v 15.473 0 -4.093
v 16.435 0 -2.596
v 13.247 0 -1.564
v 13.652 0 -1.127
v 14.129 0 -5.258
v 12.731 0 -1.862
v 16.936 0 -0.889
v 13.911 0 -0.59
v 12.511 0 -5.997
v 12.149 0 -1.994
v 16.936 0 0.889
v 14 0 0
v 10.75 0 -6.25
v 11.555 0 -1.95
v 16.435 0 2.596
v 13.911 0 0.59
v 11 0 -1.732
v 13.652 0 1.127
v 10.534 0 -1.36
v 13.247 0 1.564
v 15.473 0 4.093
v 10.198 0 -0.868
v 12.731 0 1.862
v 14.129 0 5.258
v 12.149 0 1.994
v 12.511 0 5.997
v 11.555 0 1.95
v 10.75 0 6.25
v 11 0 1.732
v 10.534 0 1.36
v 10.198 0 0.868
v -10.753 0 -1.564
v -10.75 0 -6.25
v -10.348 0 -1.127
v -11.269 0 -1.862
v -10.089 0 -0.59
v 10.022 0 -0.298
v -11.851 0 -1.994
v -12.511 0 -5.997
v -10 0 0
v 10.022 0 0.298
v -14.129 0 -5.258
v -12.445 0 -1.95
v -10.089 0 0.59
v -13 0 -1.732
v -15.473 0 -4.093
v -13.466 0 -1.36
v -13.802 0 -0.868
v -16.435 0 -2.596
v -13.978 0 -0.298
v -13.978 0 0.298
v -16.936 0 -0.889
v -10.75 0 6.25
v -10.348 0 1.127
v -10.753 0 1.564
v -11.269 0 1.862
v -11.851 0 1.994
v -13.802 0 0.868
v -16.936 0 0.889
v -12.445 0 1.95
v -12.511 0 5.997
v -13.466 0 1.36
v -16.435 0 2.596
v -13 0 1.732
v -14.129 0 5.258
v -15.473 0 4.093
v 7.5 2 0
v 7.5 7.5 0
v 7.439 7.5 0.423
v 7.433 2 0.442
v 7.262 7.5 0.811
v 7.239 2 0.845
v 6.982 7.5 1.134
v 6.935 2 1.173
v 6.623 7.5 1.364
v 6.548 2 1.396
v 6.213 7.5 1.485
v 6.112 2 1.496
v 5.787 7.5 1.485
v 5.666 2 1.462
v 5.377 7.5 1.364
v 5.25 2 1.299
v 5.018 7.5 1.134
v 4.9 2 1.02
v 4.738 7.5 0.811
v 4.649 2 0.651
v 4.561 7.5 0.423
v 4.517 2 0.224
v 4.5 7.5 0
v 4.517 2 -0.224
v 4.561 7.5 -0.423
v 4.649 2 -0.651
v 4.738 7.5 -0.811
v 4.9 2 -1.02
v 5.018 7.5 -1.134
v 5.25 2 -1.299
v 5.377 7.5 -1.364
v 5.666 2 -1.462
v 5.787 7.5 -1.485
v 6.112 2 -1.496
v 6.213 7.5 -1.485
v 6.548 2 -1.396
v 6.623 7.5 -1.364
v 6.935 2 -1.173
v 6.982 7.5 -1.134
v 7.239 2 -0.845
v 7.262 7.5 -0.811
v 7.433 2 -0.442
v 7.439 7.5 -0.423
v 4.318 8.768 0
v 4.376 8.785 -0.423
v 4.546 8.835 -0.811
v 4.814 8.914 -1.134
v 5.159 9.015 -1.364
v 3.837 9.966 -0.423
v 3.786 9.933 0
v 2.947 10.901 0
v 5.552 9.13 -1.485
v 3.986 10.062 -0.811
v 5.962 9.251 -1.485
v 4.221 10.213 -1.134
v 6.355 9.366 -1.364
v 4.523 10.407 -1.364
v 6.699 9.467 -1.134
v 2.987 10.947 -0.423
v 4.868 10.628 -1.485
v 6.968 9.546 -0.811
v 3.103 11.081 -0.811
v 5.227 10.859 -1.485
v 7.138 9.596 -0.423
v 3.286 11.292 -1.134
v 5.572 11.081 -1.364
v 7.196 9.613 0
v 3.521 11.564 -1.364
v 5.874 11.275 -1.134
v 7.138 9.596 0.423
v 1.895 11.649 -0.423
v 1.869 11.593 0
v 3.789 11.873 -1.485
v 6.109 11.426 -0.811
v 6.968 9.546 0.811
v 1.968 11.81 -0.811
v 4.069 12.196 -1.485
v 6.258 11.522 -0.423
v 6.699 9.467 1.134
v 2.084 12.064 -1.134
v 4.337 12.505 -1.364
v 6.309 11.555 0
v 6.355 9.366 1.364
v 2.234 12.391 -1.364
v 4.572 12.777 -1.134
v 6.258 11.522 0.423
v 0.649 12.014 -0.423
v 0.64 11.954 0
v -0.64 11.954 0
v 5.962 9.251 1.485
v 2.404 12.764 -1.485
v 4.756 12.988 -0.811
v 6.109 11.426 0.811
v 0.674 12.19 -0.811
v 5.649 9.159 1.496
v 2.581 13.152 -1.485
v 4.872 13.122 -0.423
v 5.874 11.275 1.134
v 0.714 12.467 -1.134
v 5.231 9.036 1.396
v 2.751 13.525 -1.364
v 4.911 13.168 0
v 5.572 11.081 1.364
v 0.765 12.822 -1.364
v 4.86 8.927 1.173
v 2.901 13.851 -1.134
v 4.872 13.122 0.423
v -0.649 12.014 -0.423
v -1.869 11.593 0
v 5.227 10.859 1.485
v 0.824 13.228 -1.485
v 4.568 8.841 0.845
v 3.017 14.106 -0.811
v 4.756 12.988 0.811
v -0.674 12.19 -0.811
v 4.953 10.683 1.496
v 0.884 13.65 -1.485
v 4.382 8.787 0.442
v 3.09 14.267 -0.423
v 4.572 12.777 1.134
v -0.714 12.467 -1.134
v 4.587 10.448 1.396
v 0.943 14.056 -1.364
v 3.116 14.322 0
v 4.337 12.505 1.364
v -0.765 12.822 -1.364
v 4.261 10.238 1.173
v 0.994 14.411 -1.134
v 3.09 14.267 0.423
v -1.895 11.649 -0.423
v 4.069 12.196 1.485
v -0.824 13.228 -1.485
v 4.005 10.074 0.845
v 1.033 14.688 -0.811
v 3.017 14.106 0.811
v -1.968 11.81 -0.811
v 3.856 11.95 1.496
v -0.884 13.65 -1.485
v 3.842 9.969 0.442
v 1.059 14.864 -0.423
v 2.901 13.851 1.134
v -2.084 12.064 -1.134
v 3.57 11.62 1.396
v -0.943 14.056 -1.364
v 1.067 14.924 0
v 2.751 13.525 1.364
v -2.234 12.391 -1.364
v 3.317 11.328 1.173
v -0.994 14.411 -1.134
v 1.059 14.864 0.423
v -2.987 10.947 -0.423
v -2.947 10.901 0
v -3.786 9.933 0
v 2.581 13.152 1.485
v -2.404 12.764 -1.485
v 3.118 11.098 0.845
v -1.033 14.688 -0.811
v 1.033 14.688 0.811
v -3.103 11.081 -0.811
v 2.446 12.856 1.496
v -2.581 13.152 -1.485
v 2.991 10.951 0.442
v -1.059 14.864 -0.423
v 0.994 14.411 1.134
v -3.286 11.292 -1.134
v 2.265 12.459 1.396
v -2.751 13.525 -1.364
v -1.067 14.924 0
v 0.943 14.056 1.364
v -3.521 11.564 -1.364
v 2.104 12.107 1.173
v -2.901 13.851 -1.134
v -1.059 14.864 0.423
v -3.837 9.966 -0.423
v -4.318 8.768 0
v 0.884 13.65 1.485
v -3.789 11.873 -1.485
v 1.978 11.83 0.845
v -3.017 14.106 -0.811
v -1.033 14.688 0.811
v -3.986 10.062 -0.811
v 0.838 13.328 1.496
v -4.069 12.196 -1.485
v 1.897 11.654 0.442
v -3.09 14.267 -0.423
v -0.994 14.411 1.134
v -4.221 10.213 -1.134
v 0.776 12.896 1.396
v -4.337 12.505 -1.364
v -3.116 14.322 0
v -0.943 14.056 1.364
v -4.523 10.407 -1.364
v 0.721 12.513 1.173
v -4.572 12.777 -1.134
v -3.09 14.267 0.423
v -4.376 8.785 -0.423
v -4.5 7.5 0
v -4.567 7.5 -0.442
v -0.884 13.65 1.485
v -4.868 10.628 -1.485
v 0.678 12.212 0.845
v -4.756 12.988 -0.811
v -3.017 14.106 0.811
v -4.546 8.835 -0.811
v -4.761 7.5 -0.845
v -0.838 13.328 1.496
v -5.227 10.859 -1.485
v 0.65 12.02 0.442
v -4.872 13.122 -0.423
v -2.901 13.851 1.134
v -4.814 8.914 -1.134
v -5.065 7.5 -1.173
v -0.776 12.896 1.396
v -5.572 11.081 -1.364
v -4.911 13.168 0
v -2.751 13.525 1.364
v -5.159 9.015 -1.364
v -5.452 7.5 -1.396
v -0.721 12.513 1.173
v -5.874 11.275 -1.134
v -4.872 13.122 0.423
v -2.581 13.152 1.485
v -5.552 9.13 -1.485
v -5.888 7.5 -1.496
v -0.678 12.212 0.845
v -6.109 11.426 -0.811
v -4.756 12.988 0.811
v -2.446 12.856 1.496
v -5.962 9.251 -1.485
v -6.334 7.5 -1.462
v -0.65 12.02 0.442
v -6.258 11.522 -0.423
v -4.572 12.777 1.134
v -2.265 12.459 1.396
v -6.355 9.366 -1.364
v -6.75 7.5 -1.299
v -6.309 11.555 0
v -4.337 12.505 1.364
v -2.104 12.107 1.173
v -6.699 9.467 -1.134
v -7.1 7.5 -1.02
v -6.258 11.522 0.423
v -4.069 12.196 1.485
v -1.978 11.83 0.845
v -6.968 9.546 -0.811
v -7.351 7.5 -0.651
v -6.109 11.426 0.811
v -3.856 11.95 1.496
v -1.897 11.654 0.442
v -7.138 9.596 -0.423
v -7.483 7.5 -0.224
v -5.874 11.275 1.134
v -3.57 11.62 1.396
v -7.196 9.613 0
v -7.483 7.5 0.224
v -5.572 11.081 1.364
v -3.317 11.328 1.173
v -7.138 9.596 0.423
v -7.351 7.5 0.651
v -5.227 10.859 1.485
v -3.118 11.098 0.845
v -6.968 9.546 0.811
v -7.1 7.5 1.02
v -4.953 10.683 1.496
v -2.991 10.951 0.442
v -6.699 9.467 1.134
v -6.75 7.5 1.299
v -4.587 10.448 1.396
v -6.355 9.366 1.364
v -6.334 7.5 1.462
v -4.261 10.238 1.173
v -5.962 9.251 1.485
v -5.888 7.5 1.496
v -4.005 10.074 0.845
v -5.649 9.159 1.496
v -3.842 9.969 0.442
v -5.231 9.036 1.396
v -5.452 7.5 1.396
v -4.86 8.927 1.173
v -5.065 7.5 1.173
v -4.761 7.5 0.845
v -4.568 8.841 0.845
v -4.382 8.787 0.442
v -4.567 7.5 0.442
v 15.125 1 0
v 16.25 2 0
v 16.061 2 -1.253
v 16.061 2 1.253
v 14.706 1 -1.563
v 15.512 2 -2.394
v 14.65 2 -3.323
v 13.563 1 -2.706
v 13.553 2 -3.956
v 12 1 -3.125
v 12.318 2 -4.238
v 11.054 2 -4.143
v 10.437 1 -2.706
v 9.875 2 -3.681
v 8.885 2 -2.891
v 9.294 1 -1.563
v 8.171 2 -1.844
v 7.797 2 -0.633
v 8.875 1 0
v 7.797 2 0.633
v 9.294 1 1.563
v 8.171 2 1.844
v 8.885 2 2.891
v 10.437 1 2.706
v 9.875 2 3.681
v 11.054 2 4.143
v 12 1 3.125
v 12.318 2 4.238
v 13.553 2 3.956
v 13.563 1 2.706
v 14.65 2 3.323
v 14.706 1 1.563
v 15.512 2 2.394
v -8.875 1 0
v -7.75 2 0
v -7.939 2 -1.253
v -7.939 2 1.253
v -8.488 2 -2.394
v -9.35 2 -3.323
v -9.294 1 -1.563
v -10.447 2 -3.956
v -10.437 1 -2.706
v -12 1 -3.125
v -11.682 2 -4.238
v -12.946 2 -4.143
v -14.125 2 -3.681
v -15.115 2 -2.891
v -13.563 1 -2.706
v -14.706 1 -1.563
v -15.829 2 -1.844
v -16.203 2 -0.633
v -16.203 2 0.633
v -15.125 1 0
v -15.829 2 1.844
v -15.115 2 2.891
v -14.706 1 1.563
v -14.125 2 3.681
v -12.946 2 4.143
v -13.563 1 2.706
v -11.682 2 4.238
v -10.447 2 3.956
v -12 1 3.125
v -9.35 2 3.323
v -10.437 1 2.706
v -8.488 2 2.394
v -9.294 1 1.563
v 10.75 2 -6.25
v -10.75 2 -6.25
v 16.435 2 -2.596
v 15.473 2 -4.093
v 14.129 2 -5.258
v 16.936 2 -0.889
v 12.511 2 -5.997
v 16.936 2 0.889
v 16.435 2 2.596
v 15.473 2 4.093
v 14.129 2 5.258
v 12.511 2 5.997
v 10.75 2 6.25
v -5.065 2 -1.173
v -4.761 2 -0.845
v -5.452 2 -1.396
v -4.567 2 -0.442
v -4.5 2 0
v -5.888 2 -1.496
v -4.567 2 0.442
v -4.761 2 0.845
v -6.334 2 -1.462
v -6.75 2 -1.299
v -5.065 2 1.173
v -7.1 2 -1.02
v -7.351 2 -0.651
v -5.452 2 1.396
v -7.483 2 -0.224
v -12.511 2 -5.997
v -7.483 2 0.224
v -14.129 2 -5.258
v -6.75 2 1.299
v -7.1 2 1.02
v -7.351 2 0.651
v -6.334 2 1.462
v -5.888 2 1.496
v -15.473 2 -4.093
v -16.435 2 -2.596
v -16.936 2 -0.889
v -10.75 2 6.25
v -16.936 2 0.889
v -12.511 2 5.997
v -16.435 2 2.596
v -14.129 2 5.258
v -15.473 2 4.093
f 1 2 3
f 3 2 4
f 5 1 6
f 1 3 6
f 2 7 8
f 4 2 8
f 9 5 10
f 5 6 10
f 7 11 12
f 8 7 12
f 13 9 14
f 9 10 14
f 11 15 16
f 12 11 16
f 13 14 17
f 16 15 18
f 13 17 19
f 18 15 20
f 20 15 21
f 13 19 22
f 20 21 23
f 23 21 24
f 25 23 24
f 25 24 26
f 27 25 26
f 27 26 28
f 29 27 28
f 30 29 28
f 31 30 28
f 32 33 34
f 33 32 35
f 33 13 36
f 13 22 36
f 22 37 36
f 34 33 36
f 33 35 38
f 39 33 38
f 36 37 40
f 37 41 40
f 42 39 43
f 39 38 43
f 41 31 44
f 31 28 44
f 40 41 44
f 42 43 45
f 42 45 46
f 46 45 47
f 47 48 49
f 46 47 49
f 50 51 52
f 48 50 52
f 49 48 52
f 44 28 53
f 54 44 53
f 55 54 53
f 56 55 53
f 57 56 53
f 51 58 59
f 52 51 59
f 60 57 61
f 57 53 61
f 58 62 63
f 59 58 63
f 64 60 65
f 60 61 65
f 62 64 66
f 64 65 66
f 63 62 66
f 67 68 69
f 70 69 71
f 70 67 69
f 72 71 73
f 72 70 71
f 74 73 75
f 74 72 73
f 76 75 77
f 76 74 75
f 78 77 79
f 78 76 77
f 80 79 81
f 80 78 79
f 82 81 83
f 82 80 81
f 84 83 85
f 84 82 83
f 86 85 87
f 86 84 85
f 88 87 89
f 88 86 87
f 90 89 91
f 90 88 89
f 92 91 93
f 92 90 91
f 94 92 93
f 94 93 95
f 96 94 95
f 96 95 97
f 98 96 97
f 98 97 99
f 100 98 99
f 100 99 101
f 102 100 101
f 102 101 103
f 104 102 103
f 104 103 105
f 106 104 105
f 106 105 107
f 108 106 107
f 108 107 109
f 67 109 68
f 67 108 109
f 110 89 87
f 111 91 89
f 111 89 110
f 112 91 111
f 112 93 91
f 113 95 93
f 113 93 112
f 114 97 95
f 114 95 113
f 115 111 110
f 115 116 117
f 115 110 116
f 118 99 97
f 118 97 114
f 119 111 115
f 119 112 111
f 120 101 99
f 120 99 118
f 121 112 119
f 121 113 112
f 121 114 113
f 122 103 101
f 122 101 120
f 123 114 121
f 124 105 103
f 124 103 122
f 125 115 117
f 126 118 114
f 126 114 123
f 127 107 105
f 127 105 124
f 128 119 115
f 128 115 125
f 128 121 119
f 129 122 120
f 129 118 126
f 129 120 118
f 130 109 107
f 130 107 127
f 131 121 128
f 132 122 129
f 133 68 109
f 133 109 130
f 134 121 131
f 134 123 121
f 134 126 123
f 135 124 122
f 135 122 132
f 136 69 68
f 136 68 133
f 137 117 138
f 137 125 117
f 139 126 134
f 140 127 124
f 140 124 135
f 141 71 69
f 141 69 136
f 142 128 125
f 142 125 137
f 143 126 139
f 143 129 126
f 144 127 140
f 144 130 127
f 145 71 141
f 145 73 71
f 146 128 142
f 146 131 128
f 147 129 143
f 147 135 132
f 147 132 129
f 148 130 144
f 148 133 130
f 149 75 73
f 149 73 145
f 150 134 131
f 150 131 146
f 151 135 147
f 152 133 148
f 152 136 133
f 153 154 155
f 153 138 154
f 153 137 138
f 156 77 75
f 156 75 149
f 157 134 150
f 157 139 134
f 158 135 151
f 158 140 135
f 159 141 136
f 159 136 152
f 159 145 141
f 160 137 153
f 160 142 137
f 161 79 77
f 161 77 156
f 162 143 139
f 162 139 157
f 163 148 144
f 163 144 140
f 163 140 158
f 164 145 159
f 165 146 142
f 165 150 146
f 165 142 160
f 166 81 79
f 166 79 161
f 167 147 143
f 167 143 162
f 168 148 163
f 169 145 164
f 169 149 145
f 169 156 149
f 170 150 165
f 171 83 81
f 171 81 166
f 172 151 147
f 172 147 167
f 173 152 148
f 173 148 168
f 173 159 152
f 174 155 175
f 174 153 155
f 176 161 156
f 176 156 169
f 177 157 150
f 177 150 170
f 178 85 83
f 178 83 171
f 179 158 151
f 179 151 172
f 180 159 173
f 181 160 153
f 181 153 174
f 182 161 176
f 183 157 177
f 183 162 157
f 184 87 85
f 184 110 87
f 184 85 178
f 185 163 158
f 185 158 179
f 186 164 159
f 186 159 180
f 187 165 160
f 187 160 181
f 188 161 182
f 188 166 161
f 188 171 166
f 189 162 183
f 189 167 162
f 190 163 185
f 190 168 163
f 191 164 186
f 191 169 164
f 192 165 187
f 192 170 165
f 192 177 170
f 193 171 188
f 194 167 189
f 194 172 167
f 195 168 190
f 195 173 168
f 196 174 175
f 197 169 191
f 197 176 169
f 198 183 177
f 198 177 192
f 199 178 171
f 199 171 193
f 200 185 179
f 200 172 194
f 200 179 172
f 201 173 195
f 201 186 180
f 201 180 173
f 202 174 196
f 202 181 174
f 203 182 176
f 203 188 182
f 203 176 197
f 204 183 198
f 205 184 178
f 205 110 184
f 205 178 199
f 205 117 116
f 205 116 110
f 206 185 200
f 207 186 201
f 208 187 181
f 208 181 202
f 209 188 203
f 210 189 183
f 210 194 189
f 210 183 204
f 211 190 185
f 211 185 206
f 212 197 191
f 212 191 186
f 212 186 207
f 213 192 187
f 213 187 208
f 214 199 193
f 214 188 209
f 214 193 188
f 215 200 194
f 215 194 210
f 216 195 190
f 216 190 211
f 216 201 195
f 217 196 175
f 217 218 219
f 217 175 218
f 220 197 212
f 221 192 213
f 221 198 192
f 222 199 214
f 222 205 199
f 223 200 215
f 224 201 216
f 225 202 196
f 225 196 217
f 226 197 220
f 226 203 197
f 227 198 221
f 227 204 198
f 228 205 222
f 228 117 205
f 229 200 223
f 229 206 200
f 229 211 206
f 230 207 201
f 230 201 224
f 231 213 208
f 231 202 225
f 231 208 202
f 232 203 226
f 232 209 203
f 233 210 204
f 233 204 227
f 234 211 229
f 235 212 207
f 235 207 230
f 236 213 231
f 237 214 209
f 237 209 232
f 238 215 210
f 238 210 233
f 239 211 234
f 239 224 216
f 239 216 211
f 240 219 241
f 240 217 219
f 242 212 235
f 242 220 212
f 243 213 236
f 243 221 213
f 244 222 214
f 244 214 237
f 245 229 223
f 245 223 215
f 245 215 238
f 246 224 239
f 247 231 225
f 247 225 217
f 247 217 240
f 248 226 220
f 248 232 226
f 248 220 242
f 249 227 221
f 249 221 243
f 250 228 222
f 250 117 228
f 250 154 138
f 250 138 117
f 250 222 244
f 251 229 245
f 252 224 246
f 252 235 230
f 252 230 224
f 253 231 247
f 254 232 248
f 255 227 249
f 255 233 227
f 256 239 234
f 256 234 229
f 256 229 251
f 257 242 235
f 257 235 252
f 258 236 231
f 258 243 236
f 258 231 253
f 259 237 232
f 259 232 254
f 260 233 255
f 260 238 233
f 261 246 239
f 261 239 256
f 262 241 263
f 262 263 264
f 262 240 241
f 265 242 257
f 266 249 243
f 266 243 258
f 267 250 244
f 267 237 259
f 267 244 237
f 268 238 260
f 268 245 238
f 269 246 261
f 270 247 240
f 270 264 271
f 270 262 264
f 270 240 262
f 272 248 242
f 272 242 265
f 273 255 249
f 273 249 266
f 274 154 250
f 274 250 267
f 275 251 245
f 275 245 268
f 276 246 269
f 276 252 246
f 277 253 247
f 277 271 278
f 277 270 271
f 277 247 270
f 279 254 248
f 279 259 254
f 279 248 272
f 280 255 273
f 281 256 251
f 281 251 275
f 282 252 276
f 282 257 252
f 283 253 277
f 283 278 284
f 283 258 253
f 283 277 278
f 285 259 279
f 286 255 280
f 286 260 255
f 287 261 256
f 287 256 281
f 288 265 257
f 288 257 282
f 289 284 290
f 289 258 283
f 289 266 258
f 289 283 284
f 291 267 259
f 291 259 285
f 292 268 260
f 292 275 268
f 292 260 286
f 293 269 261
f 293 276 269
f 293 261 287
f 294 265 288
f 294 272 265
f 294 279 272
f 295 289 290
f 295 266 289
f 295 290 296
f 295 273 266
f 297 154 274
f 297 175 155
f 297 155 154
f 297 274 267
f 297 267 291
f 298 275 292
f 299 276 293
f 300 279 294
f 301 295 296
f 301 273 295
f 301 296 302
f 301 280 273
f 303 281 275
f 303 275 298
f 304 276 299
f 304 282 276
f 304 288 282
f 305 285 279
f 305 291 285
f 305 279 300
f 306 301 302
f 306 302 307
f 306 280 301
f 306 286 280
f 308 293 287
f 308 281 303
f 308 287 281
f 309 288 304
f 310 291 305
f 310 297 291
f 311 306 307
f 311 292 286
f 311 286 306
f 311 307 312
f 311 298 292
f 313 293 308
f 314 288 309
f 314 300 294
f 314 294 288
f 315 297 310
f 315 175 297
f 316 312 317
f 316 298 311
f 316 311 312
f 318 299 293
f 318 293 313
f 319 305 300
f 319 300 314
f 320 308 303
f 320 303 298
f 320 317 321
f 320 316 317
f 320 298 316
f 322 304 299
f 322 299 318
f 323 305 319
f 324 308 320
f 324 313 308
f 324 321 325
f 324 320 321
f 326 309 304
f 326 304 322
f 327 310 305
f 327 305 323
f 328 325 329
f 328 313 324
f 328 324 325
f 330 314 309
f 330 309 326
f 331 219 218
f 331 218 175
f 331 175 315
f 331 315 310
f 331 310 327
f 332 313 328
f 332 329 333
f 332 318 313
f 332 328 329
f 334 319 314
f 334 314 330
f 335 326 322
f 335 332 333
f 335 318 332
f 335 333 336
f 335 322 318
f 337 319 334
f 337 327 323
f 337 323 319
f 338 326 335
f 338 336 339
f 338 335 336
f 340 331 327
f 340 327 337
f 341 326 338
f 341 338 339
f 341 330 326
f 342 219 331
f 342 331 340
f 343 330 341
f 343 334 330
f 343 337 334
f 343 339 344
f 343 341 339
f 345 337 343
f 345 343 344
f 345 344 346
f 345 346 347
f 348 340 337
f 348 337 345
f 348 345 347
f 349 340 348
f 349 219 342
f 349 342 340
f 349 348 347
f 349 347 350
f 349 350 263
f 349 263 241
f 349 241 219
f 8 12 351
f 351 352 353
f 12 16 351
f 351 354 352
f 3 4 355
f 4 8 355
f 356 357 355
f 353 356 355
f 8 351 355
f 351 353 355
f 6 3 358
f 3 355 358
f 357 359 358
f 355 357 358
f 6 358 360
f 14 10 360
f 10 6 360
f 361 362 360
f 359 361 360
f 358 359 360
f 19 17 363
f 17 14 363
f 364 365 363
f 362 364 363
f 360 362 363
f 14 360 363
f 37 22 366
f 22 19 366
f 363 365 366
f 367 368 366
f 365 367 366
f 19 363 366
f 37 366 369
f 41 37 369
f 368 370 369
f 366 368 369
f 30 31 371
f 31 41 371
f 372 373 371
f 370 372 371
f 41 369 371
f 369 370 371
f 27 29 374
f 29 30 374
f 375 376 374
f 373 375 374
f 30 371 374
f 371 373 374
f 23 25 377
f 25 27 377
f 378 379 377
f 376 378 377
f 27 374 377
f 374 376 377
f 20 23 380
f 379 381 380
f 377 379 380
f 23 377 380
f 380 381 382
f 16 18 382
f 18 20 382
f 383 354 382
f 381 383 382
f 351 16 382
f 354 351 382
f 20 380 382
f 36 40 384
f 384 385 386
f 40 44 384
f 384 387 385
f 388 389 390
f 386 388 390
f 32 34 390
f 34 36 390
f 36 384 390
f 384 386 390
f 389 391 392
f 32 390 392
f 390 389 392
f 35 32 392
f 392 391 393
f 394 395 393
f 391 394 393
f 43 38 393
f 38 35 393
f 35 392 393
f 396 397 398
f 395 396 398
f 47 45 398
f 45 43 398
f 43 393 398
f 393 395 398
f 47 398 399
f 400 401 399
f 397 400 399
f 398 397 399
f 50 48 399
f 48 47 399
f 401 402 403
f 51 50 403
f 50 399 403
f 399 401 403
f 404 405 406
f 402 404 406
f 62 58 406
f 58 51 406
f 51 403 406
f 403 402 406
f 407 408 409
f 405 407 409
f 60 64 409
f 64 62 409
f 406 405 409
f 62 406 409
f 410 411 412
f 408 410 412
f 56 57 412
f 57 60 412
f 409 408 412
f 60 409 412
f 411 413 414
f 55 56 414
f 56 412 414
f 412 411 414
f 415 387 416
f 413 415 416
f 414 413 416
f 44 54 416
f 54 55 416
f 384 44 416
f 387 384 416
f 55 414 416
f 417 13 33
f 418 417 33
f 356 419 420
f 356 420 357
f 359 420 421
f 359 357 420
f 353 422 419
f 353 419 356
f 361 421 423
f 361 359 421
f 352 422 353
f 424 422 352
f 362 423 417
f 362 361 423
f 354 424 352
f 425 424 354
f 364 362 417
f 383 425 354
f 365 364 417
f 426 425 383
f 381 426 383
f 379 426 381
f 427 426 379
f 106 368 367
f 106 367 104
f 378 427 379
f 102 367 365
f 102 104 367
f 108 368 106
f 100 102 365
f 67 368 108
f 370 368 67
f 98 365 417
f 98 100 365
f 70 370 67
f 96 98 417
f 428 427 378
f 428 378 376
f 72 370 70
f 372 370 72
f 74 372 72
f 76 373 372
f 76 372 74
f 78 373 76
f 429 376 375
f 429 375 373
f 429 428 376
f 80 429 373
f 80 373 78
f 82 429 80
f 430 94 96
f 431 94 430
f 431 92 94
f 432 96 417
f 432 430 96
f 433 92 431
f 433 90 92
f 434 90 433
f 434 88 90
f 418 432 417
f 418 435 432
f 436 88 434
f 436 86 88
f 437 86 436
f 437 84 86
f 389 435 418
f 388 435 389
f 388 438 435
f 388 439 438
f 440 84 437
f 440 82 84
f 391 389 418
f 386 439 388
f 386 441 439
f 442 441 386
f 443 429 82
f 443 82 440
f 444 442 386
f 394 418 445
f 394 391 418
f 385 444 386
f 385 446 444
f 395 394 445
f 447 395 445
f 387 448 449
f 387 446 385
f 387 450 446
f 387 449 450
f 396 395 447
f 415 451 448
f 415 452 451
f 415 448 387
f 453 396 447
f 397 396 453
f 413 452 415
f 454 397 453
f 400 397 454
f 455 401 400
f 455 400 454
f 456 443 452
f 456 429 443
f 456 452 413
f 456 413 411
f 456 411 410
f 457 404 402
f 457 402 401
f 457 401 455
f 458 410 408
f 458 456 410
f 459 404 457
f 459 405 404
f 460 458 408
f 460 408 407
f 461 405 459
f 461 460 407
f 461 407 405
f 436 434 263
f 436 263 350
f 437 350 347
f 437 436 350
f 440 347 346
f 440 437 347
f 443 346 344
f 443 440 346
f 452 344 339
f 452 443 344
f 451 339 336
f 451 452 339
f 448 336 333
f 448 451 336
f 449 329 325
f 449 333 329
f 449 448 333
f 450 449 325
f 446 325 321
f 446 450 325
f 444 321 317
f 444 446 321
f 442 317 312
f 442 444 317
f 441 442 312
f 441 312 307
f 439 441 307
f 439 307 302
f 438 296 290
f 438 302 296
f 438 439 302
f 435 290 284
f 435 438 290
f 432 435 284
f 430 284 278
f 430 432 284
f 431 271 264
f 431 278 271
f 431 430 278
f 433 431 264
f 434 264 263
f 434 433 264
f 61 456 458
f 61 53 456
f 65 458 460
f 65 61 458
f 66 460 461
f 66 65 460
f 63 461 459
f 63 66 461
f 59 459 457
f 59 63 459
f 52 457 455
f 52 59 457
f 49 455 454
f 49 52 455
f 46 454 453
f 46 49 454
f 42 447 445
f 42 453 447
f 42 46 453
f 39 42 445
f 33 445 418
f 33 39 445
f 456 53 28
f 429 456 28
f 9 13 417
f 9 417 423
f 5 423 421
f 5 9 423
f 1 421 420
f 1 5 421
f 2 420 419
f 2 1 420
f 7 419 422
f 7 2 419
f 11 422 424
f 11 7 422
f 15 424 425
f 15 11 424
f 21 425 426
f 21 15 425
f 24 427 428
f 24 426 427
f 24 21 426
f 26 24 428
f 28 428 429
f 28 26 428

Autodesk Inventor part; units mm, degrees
sketch "Sketch_1" plane through (0, 0, 0) normal (0, 1, 0) x (-1, 0, 0)
  arc A0 (10.75, -6.25) -> (10.75, 6.25) centre (10.75, 0) ccw
  line L0 (10.75, 6.25) -> (-10.75, 6.25)
  arc A1 (-10.75, 6.25) -> (-10.75, -6.25) centre (-10.75, 0) ccw
  line L1 (-10.75, -6.25) -> (10.75, -6.25)
extrude "Extrusion1" add sketch "Sketch_1" along normal blind 2
sketch "Sketch_2" plane through (0, 2, 0) normal (0, 1, 0) x (1, 0, 0)
  circle A0 centre (-6, 0) radius 1.5
extrude "Extrusion2" add sketch "Sketch_2" along normal blind 5.5
sketch "Sketch_3" plane through (0, 2, 0) normal (0, 1, 0) x (1, 0, 0)
  circle A0 centre (6, 0) radius 1.5
extrude "Extrusion3" add sketch "Sketch_3" along normal blind 5.5
sketch "Sketch_4" plane through (0, 7.5, 0) normal (0, 1, 0) x (1, 0, 0)
  line L0 (0, 5) -> (0, -5)
  circle A0 centre (-6, 0) radius 1.5
revolve "Revolution1" add sketch "Sketch_4" angle 180 about axis through (0, 7.5, -5) along (0, 0, -1)
sketch "Sketch_5" plane through (0, 0, 0) normal (0, 0, 1) x (1, 0, 0)
  line L0 (-12, 0) -> (-12, 2)
  line L1 (-12, 2) -> (-7.75, 2)
  line L2 (-7.75, 2) -> (-10, 0)
  line L3 (-10, 0) -> (-12, 0)
  line L4 (-12, 0) -> (-12, 2)
revolve "Revolution2" cut sketch "Sketch_5" angle 360 about axis through (-12, 0, 0) along (0, -1, 0)
sketch "Sketch_7" plane through (0, 0, 0) normal (0, 0, 1) x (1, 0, 0)
  line L0 (12, 0) -> (12, 2)
  line L1 (12, 2) -> (16.25, 2)
  line L2 (16.25, 2) -> (14, 0)
  line L3 (14, 0) -> (12, 0)
  line L4 (12, 0) -> (12, 2)
revolve "Revolution3" cut sketch "Sketch_7" angle 360 about axis through (12, 0, 0) along (0, -1, 0)
ref_plane "cp1_XY" through (-12, 0, 0) normal (0, 1, 0) x (1, 0, 0)
ref_plane "cp1_YZ" through (-12, 0, 0) normal (1, 0, 0) x (0, 0, -1)
ref_plane "cp1_ZX" through (-12, 0, 0) normal (0, 0, -1) x (0, 1, 0)
ref_plane "cp2_XY" through (12, 0, 0) normal (0, 1, 0) x (1, 0, 0)
ref_plane "cp2_YZ" through (12, 0, 0) normal (1, 0, 0) x (0, 0, -1)
ref_plane "cp2_ZX" through (12, 0, 0) normal (0, 0, -1) x (0, 1, 0)
ref_plane "to_wire_XY" through (0, 13.5, 0) normal (1, 0, 0) x (0, 0, -1)
ref_plane "to_wire_YZ" through (0, 13.5, 0) normal (0, 0, -1) x (0, 1, 0)
ref_plane "to_wire_ZX" through (0, 13.5, 0) normal (0, 1, 0) x (1, 0, 0)
properties part number "TKCb"
